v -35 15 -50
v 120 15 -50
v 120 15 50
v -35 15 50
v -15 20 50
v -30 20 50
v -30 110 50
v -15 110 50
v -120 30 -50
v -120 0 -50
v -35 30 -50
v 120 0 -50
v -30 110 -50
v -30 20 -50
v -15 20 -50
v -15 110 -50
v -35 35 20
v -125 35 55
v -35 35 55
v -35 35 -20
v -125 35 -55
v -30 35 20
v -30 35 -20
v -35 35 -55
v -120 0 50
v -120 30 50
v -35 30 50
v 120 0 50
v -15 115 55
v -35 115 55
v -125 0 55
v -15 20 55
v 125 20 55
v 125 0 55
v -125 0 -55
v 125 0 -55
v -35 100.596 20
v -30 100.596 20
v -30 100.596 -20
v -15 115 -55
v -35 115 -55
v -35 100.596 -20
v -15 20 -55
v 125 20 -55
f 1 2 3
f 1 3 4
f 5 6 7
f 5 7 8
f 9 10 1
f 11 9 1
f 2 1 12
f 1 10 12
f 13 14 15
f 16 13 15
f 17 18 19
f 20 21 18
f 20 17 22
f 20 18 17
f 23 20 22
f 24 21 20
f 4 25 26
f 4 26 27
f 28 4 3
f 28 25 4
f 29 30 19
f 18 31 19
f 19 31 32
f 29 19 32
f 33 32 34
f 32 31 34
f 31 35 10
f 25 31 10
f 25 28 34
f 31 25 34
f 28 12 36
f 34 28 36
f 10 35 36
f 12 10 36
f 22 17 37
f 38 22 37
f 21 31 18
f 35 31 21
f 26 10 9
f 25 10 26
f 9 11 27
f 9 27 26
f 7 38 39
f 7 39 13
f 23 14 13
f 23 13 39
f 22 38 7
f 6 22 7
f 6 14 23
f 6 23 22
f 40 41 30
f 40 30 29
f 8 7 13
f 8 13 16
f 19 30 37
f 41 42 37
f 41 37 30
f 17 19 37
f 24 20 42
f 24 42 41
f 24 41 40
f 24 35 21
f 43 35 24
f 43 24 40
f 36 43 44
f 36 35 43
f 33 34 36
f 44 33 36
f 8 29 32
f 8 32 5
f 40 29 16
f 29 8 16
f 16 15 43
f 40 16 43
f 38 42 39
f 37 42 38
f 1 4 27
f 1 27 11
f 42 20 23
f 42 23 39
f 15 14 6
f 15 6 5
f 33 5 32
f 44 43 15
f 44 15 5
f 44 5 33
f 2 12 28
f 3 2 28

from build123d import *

# Parameters (mm, degrees)
SKETCH1_W           = 250
SKETCH1_H           = 110
BOSS_EXTRUDE1_DEPTH = 20
SKETCH2_W           = 110
SKETCH2_H           = 110
BOSS_EXTRUDE2_DEPTH = 15
SKETCH3_W           = 20
SKETCH3_H           = 110
BOSS_EXTRUDE3_DEPTH = 80
SKETCH4_W           = 40
SKETCH4_H           = 65.596067404
CUT_EXTRUDE1_DEPTH  = 80
SKETCH6_W           = 240
SKETCH6_H           = 100
CUT_EXTRUDE2_DEPTH  = 15
SKETCH7_W           = 85
SKETCH7_H           = 100
CUT_EXTRUDE3_DEPTH  = 15
SKETCH9_W           = 17.224689948
SKETCH9_H           = 100
CUT_EXTRUDE4_DEPTH  = 95
SKETCH10_W          = 17.224689948
SKETCH10_H          = 100
BOSS_EXTRUDE4_DEPTH = 5


with BuildPart() as part:
    # Sketch1 → Boss-Extrude1 (new body)
    with BuildSketch(Plane(origin=(0, 0, 0), x_dir=(1, 0, 0), z_dir=(0, 1, 0))):
        Rectangle(SKETCH1_W, SKETCH1_H)
    extrude(amount=BOSS_EXTRUDE1_DEPTH)

    # Sketch2 → Boss-Extrude2 (add)
    with BuildSketch(Plane(origin=(0, 20, 0), x_dir=(1, 0, 0), z_dir=(0, 1, 0))):
        with Locations((-70, 0)):
            Rectangle(SKETCH2_W, SKETCH2_H)
    extrude(amount=BOSS_EXTRUDE2_DEPTH)

    # Sketch3 → Boss-Extrude3 (add)
    with BuildSketch(Plane(origin=(0, 35, 0), x_dir=(1, 0, 0), z_dir=(0, 1, 0))):
        with Locations((-25, 0)):
            Rectangle(SKETCH3_W, SKETCH3_H)
    extrude(amount=BOSS_EXTRUDE3_DEPTH)

    # Sketch4 → Cut-Extrude1 (cut)
    with BuildSketch(Plane.ZY.offset(35)):
        with Locations((0, 67.798033702)):
            Rectangle(SKETCH4_W, SKETCH4_H)
    extrude(amount=-CUT_EXTRUDE1_DEPTH, mode=Mode.SUBTRACT)

    # Sketch6 → Cut-Extrude2 (cut)
    with BuildSketch(Plane.XZ):
        Rectangle(SKETCH6_W, SKETCH6_H)
    extrude(amount=-CUT_EXTRUDE2_DEPTH, mode=Mode.SUBTRACT)

    # Sketch7 → Cut-Extrude3 (cut)
    with BuildSketch(Plane(origin=(0, 15, 0), x_dir=(-1, 0, 0), z_dir=(0, -1, 0))):
        with Locations((77.5, 0)):
            Rectangle(SKETCH7_W, SKETCH7_H)
    extrude(amount=-CUT_EXTRUDE3_DEPTH, mode=Mode.SUBTRACT)

    # Sketch9 → Cut-Extrude4 (cut)
    with BuildSketch(Plane.XZ.offset(-15)):
        with Locations((-21.387655026, 0)):
            Rectangle(SKETCH9_W, SKETCH9_H)
    extrude(amount=-CUT_EXTRUDE4_DEPTH, mode=Mode.SUBTRACT)

    # Sketch10 → Boss-Extrude4 (add)
    with BuildSketch(Plane(origin=(0, 15, 0), x_dir=(-1, 0, 0), z_dir=(0, -1, 0))):
        with Locations((21.387655026, 0)):
            Rectangle(SKETCH10_W, SKETCH10_H)
    extrude(amount=-BOSS_EXTRUDE4_DEPTH)


solid = part.part
